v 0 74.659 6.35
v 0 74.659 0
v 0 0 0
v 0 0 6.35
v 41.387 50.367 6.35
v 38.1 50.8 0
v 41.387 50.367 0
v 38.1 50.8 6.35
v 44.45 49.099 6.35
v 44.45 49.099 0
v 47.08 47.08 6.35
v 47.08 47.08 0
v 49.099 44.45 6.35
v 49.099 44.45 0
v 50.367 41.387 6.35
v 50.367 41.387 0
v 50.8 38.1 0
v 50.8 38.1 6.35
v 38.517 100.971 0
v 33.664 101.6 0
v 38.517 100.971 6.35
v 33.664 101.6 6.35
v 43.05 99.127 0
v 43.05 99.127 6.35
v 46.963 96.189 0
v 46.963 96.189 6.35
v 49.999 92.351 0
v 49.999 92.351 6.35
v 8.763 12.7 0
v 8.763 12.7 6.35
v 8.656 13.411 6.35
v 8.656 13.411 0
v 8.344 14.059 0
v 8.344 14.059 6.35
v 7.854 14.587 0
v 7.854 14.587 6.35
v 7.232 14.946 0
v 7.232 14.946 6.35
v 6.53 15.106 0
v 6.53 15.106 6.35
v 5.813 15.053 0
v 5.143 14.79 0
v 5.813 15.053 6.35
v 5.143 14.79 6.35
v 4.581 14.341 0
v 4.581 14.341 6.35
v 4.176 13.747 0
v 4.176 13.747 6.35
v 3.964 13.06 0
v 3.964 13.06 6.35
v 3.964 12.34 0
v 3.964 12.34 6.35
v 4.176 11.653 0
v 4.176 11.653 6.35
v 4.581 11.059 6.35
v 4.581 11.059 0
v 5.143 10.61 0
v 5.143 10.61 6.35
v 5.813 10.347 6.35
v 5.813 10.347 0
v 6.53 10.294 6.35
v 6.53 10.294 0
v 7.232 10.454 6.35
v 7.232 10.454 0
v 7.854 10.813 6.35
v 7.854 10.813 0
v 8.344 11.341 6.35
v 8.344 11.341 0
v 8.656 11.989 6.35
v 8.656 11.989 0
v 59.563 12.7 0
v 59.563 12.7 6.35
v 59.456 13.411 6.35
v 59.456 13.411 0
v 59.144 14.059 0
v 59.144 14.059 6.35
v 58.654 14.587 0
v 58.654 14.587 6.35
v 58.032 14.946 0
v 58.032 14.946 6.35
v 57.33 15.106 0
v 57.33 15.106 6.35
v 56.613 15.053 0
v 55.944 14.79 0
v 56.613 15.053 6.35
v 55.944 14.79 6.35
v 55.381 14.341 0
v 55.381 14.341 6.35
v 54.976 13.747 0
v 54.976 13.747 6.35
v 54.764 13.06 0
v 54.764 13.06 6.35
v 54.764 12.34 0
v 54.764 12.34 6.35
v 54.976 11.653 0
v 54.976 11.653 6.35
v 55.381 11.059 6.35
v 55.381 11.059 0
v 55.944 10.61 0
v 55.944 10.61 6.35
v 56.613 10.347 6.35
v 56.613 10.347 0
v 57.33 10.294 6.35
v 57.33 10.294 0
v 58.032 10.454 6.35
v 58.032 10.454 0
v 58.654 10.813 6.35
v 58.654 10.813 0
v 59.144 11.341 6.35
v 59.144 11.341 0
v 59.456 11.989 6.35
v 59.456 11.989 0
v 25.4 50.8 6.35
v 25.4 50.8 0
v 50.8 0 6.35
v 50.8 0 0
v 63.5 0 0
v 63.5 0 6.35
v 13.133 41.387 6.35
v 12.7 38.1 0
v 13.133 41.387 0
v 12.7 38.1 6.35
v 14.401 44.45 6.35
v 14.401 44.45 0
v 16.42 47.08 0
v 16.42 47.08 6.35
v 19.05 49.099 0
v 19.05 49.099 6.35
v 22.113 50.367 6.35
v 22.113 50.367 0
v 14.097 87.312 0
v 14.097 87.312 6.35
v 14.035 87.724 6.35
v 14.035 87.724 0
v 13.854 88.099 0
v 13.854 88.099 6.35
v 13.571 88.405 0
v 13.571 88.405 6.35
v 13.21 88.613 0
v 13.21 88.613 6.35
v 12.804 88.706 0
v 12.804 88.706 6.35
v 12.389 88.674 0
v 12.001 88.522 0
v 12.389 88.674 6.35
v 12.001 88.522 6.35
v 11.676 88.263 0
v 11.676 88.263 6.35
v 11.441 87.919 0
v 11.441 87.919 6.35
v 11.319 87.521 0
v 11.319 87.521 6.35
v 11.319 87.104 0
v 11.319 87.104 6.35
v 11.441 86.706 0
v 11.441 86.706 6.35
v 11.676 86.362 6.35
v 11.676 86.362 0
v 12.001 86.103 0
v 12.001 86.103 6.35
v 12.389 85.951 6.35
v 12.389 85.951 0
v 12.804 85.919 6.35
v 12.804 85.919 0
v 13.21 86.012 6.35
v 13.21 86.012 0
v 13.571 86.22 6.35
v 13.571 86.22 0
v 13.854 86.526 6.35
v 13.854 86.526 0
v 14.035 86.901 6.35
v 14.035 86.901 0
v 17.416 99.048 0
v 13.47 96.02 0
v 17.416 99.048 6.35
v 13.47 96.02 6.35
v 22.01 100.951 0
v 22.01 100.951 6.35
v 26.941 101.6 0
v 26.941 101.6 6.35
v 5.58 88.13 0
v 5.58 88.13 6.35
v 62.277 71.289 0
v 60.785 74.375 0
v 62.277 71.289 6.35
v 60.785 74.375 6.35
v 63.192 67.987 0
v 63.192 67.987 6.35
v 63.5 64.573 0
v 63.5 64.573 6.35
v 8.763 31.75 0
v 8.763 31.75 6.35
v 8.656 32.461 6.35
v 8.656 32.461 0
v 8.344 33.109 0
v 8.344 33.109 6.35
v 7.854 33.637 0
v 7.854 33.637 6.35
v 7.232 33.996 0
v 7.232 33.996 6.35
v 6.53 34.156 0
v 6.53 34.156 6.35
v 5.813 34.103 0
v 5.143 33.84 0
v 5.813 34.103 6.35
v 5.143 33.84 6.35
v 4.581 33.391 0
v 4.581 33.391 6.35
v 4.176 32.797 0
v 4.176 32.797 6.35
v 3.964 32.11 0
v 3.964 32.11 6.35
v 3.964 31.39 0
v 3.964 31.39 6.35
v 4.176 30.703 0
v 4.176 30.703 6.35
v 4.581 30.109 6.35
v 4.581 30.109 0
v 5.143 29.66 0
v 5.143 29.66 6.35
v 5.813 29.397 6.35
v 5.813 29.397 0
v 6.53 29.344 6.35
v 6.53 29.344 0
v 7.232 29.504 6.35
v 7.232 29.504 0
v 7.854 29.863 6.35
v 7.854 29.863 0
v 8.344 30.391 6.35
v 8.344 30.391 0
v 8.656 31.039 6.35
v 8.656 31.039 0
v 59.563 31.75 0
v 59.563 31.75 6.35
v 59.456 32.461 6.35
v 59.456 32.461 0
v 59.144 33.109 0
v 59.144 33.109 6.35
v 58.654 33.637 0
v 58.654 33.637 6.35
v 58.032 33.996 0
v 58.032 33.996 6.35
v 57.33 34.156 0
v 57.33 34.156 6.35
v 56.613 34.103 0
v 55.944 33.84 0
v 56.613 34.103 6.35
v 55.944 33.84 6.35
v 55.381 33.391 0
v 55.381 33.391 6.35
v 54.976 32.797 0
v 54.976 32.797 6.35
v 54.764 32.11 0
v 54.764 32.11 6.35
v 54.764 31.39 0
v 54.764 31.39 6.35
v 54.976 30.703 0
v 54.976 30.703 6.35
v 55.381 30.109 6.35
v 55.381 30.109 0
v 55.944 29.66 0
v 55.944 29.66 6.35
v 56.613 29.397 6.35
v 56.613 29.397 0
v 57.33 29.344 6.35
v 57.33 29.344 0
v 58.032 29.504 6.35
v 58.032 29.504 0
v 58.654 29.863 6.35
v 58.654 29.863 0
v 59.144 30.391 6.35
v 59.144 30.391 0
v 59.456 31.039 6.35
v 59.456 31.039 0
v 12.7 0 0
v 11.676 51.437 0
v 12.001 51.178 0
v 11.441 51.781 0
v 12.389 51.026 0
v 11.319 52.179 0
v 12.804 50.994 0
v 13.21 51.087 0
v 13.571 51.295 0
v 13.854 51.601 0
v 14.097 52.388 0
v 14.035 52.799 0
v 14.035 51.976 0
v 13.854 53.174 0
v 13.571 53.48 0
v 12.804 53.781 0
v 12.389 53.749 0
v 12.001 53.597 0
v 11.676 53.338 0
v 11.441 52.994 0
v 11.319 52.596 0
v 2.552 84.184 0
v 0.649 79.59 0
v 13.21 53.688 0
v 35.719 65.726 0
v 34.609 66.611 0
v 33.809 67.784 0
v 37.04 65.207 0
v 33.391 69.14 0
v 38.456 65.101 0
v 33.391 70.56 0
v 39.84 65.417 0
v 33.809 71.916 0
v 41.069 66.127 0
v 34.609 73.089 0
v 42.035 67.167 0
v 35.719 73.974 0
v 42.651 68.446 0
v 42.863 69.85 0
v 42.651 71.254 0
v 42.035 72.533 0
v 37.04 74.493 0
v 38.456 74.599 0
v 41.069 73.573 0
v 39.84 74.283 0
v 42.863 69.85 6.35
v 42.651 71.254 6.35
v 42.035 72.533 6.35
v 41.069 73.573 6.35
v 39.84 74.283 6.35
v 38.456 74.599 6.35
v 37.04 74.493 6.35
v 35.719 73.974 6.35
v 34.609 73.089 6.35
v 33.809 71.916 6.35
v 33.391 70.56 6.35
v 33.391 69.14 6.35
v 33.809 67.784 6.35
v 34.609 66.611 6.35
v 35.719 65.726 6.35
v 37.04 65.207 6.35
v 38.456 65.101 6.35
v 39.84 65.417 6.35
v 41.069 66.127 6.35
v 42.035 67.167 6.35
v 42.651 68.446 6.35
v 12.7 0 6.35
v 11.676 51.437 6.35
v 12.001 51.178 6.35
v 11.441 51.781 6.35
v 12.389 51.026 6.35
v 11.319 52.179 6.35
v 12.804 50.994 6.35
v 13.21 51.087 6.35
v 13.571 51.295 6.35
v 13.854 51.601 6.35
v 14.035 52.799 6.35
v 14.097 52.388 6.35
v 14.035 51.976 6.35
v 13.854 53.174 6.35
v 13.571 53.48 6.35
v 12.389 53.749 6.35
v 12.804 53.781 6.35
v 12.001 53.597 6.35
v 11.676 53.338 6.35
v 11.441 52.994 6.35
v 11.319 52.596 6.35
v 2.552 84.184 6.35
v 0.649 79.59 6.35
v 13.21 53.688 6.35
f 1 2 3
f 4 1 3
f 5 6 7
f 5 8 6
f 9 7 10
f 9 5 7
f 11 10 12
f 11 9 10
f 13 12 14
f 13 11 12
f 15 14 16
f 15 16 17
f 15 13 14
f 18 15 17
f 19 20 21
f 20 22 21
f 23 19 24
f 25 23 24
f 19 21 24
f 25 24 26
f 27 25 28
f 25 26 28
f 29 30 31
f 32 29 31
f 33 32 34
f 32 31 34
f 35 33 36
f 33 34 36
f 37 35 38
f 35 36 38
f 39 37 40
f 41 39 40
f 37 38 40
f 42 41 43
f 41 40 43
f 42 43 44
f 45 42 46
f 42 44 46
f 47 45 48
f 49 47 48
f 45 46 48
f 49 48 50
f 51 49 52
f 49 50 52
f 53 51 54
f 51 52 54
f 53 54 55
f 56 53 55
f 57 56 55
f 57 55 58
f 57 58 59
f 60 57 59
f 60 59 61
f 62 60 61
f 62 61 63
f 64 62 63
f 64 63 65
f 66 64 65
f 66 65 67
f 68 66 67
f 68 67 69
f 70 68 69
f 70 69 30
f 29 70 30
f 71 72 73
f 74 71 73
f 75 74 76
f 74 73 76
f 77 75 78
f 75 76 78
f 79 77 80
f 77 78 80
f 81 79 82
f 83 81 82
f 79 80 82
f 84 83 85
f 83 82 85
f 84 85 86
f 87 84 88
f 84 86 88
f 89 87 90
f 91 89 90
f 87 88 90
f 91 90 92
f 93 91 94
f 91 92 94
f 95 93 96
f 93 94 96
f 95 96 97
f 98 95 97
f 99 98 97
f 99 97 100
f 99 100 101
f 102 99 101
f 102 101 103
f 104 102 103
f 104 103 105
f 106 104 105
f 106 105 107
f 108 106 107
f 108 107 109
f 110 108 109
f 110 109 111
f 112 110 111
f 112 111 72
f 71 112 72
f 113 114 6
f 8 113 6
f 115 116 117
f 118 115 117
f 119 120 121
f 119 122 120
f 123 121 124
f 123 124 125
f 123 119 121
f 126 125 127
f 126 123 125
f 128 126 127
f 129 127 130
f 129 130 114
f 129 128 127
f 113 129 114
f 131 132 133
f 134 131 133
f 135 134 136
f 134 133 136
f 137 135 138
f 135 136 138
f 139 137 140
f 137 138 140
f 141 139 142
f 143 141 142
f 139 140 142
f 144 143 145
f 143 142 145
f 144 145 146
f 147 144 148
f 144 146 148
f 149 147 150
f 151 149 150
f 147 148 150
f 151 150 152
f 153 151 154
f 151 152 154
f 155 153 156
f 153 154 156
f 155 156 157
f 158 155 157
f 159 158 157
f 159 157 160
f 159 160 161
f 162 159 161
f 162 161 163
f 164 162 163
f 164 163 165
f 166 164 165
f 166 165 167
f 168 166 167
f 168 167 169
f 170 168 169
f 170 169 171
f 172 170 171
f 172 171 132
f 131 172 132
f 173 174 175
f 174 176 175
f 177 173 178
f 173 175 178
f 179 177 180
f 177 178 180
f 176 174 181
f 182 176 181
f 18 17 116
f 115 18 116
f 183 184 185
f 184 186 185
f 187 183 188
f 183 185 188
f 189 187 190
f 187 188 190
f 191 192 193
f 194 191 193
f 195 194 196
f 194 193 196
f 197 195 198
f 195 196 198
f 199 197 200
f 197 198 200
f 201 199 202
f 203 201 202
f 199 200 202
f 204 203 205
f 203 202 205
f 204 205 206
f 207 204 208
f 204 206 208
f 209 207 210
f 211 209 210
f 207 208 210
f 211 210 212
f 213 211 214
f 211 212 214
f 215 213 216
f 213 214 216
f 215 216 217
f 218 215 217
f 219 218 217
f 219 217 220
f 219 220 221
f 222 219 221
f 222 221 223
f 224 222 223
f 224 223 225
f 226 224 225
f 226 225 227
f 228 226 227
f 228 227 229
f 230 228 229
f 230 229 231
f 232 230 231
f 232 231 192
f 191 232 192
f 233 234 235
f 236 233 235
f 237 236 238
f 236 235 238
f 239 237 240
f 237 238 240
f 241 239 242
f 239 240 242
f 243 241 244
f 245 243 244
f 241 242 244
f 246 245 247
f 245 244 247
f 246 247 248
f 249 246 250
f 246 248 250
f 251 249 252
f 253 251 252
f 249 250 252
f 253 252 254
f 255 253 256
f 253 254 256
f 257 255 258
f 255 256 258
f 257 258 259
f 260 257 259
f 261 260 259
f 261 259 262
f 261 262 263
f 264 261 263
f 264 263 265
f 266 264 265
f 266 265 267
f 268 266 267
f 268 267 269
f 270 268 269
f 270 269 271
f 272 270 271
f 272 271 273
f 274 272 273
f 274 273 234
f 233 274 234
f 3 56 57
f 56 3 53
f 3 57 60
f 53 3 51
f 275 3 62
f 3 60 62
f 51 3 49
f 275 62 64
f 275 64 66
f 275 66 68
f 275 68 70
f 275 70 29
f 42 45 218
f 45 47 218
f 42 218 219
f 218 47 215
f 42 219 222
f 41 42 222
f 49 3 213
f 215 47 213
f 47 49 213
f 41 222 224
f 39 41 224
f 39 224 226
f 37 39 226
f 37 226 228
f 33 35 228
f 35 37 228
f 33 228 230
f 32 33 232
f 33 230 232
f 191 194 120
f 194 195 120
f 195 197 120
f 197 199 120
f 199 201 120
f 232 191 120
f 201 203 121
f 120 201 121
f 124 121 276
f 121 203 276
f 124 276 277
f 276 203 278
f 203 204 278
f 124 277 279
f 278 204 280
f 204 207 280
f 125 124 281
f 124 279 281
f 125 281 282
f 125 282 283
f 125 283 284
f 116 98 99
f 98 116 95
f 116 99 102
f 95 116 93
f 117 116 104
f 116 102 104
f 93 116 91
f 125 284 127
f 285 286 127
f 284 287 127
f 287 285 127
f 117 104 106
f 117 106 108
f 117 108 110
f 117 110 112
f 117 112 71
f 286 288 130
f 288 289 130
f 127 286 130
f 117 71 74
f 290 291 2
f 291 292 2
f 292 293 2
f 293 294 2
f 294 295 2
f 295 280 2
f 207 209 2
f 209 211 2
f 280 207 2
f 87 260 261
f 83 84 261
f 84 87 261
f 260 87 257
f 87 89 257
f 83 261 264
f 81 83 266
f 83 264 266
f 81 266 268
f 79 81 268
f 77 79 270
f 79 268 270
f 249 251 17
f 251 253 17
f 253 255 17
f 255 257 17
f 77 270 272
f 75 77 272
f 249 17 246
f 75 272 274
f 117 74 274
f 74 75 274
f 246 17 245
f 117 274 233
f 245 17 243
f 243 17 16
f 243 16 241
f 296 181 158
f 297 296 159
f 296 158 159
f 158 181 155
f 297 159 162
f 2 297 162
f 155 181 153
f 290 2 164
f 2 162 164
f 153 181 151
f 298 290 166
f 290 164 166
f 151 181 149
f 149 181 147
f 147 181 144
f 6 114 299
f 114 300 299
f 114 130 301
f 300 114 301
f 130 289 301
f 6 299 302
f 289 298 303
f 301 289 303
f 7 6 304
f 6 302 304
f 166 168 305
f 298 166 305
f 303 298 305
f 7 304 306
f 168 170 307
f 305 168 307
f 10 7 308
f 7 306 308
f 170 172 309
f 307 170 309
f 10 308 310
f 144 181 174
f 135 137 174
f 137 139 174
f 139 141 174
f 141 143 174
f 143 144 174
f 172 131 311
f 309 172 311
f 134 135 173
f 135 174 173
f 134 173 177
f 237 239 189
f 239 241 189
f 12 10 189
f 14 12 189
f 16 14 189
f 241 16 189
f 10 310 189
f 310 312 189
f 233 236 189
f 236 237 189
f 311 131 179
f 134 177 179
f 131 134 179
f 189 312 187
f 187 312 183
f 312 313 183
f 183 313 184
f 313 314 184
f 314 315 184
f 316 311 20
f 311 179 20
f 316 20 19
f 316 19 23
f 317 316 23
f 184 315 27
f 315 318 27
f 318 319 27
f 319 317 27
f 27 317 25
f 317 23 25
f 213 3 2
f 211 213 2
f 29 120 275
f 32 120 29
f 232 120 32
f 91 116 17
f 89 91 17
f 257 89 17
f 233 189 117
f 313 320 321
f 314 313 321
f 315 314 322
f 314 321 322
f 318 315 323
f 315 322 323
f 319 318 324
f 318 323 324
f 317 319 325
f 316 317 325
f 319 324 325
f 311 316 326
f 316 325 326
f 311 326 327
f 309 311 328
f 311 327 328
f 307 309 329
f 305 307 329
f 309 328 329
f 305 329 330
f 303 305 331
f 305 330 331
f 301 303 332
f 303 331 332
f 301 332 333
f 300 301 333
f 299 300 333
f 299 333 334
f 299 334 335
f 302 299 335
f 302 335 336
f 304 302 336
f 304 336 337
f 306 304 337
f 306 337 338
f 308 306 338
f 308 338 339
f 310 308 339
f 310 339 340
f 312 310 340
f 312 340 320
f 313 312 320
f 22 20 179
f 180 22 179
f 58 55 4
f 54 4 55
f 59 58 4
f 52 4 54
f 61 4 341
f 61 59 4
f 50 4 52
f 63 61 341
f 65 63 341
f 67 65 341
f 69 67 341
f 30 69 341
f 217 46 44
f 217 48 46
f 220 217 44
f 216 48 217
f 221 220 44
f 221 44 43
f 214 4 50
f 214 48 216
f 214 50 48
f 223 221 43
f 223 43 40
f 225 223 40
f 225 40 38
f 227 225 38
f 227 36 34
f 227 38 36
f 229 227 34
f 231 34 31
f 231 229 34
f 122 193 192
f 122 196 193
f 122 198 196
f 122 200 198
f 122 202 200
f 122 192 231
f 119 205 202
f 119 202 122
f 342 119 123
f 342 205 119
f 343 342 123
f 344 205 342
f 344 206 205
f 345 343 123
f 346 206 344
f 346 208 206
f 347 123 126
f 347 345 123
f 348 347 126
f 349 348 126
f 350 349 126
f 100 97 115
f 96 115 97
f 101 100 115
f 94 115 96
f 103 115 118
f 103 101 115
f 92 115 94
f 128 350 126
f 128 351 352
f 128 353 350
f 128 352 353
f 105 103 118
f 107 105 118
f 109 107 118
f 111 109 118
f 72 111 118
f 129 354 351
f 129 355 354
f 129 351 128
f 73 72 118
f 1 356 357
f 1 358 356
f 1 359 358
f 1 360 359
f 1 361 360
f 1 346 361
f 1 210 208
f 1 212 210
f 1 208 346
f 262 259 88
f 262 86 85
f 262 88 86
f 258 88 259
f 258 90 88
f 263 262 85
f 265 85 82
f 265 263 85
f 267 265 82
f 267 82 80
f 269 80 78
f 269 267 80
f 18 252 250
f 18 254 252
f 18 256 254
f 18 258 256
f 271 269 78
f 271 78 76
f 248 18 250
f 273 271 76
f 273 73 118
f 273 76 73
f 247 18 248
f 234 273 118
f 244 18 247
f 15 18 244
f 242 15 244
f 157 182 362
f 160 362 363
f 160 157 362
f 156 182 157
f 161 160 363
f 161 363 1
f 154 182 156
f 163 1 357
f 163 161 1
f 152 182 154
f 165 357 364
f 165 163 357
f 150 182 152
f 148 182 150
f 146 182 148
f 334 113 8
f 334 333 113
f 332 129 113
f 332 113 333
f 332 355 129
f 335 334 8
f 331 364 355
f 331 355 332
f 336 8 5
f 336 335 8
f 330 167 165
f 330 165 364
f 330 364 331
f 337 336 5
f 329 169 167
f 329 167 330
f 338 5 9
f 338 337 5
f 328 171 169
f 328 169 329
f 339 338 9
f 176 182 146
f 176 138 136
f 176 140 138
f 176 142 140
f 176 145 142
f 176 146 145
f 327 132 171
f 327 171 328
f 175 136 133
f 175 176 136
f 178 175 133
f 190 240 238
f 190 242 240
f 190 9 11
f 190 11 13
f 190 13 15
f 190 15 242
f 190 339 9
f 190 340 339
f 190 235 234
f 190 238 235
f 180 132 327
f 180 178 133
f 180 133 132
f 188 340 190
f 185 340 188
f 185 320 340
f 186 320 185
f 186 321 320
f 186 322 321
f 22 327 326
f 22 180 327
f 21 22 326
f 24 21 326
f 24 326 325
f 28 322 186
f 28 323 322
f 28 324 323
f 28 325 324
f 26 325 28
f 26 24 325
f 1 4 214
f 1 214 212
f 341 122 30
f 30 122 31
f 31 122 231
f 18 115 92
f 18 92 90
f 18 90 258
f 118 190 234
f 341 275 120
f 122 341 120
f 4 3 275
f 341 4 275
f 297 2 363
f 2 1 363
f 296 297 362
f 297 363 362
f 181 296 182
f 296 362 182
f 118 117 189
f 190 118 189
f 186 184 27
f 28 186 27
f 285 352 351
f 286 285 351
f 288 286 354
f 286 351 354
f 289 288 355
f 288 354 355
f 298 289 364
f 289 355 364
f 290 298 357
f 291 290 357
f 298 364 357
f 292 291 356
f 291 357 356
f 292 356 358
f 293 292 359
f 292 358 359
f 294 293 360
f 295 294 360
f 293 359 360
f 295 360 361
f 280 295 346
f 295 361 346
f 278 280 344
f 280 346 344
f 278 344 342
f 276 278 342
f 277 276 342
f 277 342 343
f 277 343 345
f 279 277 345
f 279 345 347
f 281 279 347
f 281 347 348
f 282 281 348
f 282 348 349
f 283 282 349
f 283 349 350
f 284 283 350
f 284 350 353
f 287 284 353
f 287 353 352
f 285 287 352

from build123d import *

# Parameters (mm, degrees)
BOSS_EXTRUDE1_DEPTH = 6.35
CUT_EXTRUDE1_REACH  = 8.35
SKETCH2_R           = 2.413
CUT_EXTRUDE3_REACH  = 8.35
SKETCH4_R           = 1.397
SKETCH4_R_2         = 4.7625
FILLET4_R           = 12.7
FILLET5_R           = 19.05


with BuildPart() as part:
    # Sketch1 → Boss-Extrude1 (new body)
    with BuildSketch(Plane.XY):
        Polygon((0, 0), (12.7, 0), (12.7, 50.8), (50.8, 50.8), (50.8, 0), (63.5, 0), (63.5, 69.85), (44.45, 101.6), (19.05, 101.6), (0, 82.55), align=None)
    extrude(amount=BOSS_EXTRUDE1_DEPTH)

    # Sketch2 → Cut-Extrude1 (cut, up to next)
    with BuildSketch(Plane.XY.offset(6.35), mode=Mode.PRIVATE) as cut_extrude1_sk1:
        with Locations((6.35, 12.7)):
            Circle(SKETCH2_R)
    cut_extrude1_tool1 = extrude(cut_extrude1_sk1.sketch, amount=-CUT_EXTRUDE1_REACH, mode=Mode.PRIVATE) & part.part
    add(cut_extrude1_tool1.solids().sort_by_distance((6.35, 12.7, 6.35))[0], mode=Mode.SUBTRACT)
    # Sketch2 → Cut-Extrude1 (cut, up to next)
    with BuildSketch(Plane.XY.offset(6.35), mode=Mode.PRIVATE) as cut_extrude1_sk2:
        with Locations((6.35, 31.75)):
            Circle(SKETCH2_R)
    cut_extrude1_tool2 = extrude(cut_extrude1_sk2.sketch, amount=-CUT_EXTRUDE1_REACH, mode=Mode.PRIVATE) & part.part
    add(cut_extrude1_tool2.solids().sort_by_distance((6.35, 31.75, 6.35))[0], mode=Mode.SUBTRACT)
    # Sketch2 → Cut-Extrude1 (cut, up to next)
    with BuildSketch(Plane.XY.offset(6.35), mode=Mode.PRIVATE) as cut_extrude1_sk3:
        with Locations((57.15, 12.7)):
            Circle(SKETCH2_R)
    cut_extrude1_tool3 = extrude(cut_extrude1_sk3.sketch, amount=-CUT_EXTRUDE1_REACH, mode=Mode.PRIVATE) & part.part
    add(cut_extrude1_tool3.solids().sort_by_distance((57.15, 12.7, 6.35))[0], mode=Mode.SUBTRACT)
    # Sketch2 → Cut-Extrude1 (cut, up to next)
    with BuildSketch(Plane.XY.offset(6.35), mode=Mode.PRIVATE) as cut_extrude1_sk4:
        with Locations((57.15, 31.75)):
            Circle(SKETCH2_R)
    cut_extrude1_tool4 = extrude(cut_extrude1_sk4.sketch, amount=-CUT_EXTRUDE1_REACH, mode=Mode.PRIVATE) & part.part
    add(cut_extrude1_tool4.solids().sort_by_distance((57.15, 31.75, 6.35))[0], mode=Mode.SUBTRACT)

    # Sketch4 → Cut-Extrude3 (cut, up to next)
    with BuildSketch(Plane.XY.offset(6.35), mode=Mode.PRIVATE) as cut_extrude3_sk1:
        with Locations((12.7, 52.3875)):
            Circle(SKETCH4_R)
    cut_extrude3_tool1 = extrude(cut_extrude3_sk1.sketch, amount=-CUT_EXTRUDE3_REACH, mode=Mode.PRIVATE) & part.part
    add(cut_extrude3_tool1.solids().sort_by_distance((12.7, 52.3875, 6.35))[0], mode=Mode.SUBTRACT)
    # Sketch4 → Cut-Extrude3 (cut, up to next)
    with BuildSketch(Plane.XY.offset(6.35), mode=Mode.PRIVATE) as cut_extrude3_sk2:
        with Locations((12.7, 87.3125)):
            Circle(SKETCH4_R)
    cut_extrude3_tool2 = extrude(cut_extrude3_sk2.sketch, amount=-CUT_EXTRUDE3_REACH, mode=Mode.PRIVATE) & part.part
    add(cut_extrude3_tool2.solids().sort_by_distance((12.7, 87.3125, 6.35))[0], mode=Mode.SUBTRACT)
    # Sketch4 → Cut-Extrude3 (cut, up to next)
    with BuildSketch(Plane.XY.offset(6.35), mode=Mode.PRIVATE) as cut_extrude3_sk3:
        with Locations((38.1, 69.85)):
            Circle(SKETCH4_R_2)
    cut_extrude3_tool3 = extrude(cut_extrude3_sk3.sketch, amount=-CUT_EXTRUDE3_REACH, mode=Mode.PRIVATE) & part.part
    add(cut_extrude3_tool3.solids().sort_by_distance((38.1, 69.85, 6.35))[0], mode=Mode.SUBTRACT)

    # Fillet4
    fillet4_edges = [part.edges().sort_by_distance(p)[0] for p in [
        (50.8, 50.8, 3.175),
        (12.7, 50.8, 3.175),
    ]]
    fillet(fillet4_edges, radius=FILLET4_R)

    # Fillet5
    fillet5_edges = [part.edges().sort_by_distance(p)[0] for p in [
        (0, 82.55, 3.175),
        (19.05, 101.6, 3.175),
        (44.45, 101.6, 3.175),
        (63.5, 69.85, 3.175),
    ]]
    fillet(fillet5_edges, radius=FILLET5_R)


solid = part.part
